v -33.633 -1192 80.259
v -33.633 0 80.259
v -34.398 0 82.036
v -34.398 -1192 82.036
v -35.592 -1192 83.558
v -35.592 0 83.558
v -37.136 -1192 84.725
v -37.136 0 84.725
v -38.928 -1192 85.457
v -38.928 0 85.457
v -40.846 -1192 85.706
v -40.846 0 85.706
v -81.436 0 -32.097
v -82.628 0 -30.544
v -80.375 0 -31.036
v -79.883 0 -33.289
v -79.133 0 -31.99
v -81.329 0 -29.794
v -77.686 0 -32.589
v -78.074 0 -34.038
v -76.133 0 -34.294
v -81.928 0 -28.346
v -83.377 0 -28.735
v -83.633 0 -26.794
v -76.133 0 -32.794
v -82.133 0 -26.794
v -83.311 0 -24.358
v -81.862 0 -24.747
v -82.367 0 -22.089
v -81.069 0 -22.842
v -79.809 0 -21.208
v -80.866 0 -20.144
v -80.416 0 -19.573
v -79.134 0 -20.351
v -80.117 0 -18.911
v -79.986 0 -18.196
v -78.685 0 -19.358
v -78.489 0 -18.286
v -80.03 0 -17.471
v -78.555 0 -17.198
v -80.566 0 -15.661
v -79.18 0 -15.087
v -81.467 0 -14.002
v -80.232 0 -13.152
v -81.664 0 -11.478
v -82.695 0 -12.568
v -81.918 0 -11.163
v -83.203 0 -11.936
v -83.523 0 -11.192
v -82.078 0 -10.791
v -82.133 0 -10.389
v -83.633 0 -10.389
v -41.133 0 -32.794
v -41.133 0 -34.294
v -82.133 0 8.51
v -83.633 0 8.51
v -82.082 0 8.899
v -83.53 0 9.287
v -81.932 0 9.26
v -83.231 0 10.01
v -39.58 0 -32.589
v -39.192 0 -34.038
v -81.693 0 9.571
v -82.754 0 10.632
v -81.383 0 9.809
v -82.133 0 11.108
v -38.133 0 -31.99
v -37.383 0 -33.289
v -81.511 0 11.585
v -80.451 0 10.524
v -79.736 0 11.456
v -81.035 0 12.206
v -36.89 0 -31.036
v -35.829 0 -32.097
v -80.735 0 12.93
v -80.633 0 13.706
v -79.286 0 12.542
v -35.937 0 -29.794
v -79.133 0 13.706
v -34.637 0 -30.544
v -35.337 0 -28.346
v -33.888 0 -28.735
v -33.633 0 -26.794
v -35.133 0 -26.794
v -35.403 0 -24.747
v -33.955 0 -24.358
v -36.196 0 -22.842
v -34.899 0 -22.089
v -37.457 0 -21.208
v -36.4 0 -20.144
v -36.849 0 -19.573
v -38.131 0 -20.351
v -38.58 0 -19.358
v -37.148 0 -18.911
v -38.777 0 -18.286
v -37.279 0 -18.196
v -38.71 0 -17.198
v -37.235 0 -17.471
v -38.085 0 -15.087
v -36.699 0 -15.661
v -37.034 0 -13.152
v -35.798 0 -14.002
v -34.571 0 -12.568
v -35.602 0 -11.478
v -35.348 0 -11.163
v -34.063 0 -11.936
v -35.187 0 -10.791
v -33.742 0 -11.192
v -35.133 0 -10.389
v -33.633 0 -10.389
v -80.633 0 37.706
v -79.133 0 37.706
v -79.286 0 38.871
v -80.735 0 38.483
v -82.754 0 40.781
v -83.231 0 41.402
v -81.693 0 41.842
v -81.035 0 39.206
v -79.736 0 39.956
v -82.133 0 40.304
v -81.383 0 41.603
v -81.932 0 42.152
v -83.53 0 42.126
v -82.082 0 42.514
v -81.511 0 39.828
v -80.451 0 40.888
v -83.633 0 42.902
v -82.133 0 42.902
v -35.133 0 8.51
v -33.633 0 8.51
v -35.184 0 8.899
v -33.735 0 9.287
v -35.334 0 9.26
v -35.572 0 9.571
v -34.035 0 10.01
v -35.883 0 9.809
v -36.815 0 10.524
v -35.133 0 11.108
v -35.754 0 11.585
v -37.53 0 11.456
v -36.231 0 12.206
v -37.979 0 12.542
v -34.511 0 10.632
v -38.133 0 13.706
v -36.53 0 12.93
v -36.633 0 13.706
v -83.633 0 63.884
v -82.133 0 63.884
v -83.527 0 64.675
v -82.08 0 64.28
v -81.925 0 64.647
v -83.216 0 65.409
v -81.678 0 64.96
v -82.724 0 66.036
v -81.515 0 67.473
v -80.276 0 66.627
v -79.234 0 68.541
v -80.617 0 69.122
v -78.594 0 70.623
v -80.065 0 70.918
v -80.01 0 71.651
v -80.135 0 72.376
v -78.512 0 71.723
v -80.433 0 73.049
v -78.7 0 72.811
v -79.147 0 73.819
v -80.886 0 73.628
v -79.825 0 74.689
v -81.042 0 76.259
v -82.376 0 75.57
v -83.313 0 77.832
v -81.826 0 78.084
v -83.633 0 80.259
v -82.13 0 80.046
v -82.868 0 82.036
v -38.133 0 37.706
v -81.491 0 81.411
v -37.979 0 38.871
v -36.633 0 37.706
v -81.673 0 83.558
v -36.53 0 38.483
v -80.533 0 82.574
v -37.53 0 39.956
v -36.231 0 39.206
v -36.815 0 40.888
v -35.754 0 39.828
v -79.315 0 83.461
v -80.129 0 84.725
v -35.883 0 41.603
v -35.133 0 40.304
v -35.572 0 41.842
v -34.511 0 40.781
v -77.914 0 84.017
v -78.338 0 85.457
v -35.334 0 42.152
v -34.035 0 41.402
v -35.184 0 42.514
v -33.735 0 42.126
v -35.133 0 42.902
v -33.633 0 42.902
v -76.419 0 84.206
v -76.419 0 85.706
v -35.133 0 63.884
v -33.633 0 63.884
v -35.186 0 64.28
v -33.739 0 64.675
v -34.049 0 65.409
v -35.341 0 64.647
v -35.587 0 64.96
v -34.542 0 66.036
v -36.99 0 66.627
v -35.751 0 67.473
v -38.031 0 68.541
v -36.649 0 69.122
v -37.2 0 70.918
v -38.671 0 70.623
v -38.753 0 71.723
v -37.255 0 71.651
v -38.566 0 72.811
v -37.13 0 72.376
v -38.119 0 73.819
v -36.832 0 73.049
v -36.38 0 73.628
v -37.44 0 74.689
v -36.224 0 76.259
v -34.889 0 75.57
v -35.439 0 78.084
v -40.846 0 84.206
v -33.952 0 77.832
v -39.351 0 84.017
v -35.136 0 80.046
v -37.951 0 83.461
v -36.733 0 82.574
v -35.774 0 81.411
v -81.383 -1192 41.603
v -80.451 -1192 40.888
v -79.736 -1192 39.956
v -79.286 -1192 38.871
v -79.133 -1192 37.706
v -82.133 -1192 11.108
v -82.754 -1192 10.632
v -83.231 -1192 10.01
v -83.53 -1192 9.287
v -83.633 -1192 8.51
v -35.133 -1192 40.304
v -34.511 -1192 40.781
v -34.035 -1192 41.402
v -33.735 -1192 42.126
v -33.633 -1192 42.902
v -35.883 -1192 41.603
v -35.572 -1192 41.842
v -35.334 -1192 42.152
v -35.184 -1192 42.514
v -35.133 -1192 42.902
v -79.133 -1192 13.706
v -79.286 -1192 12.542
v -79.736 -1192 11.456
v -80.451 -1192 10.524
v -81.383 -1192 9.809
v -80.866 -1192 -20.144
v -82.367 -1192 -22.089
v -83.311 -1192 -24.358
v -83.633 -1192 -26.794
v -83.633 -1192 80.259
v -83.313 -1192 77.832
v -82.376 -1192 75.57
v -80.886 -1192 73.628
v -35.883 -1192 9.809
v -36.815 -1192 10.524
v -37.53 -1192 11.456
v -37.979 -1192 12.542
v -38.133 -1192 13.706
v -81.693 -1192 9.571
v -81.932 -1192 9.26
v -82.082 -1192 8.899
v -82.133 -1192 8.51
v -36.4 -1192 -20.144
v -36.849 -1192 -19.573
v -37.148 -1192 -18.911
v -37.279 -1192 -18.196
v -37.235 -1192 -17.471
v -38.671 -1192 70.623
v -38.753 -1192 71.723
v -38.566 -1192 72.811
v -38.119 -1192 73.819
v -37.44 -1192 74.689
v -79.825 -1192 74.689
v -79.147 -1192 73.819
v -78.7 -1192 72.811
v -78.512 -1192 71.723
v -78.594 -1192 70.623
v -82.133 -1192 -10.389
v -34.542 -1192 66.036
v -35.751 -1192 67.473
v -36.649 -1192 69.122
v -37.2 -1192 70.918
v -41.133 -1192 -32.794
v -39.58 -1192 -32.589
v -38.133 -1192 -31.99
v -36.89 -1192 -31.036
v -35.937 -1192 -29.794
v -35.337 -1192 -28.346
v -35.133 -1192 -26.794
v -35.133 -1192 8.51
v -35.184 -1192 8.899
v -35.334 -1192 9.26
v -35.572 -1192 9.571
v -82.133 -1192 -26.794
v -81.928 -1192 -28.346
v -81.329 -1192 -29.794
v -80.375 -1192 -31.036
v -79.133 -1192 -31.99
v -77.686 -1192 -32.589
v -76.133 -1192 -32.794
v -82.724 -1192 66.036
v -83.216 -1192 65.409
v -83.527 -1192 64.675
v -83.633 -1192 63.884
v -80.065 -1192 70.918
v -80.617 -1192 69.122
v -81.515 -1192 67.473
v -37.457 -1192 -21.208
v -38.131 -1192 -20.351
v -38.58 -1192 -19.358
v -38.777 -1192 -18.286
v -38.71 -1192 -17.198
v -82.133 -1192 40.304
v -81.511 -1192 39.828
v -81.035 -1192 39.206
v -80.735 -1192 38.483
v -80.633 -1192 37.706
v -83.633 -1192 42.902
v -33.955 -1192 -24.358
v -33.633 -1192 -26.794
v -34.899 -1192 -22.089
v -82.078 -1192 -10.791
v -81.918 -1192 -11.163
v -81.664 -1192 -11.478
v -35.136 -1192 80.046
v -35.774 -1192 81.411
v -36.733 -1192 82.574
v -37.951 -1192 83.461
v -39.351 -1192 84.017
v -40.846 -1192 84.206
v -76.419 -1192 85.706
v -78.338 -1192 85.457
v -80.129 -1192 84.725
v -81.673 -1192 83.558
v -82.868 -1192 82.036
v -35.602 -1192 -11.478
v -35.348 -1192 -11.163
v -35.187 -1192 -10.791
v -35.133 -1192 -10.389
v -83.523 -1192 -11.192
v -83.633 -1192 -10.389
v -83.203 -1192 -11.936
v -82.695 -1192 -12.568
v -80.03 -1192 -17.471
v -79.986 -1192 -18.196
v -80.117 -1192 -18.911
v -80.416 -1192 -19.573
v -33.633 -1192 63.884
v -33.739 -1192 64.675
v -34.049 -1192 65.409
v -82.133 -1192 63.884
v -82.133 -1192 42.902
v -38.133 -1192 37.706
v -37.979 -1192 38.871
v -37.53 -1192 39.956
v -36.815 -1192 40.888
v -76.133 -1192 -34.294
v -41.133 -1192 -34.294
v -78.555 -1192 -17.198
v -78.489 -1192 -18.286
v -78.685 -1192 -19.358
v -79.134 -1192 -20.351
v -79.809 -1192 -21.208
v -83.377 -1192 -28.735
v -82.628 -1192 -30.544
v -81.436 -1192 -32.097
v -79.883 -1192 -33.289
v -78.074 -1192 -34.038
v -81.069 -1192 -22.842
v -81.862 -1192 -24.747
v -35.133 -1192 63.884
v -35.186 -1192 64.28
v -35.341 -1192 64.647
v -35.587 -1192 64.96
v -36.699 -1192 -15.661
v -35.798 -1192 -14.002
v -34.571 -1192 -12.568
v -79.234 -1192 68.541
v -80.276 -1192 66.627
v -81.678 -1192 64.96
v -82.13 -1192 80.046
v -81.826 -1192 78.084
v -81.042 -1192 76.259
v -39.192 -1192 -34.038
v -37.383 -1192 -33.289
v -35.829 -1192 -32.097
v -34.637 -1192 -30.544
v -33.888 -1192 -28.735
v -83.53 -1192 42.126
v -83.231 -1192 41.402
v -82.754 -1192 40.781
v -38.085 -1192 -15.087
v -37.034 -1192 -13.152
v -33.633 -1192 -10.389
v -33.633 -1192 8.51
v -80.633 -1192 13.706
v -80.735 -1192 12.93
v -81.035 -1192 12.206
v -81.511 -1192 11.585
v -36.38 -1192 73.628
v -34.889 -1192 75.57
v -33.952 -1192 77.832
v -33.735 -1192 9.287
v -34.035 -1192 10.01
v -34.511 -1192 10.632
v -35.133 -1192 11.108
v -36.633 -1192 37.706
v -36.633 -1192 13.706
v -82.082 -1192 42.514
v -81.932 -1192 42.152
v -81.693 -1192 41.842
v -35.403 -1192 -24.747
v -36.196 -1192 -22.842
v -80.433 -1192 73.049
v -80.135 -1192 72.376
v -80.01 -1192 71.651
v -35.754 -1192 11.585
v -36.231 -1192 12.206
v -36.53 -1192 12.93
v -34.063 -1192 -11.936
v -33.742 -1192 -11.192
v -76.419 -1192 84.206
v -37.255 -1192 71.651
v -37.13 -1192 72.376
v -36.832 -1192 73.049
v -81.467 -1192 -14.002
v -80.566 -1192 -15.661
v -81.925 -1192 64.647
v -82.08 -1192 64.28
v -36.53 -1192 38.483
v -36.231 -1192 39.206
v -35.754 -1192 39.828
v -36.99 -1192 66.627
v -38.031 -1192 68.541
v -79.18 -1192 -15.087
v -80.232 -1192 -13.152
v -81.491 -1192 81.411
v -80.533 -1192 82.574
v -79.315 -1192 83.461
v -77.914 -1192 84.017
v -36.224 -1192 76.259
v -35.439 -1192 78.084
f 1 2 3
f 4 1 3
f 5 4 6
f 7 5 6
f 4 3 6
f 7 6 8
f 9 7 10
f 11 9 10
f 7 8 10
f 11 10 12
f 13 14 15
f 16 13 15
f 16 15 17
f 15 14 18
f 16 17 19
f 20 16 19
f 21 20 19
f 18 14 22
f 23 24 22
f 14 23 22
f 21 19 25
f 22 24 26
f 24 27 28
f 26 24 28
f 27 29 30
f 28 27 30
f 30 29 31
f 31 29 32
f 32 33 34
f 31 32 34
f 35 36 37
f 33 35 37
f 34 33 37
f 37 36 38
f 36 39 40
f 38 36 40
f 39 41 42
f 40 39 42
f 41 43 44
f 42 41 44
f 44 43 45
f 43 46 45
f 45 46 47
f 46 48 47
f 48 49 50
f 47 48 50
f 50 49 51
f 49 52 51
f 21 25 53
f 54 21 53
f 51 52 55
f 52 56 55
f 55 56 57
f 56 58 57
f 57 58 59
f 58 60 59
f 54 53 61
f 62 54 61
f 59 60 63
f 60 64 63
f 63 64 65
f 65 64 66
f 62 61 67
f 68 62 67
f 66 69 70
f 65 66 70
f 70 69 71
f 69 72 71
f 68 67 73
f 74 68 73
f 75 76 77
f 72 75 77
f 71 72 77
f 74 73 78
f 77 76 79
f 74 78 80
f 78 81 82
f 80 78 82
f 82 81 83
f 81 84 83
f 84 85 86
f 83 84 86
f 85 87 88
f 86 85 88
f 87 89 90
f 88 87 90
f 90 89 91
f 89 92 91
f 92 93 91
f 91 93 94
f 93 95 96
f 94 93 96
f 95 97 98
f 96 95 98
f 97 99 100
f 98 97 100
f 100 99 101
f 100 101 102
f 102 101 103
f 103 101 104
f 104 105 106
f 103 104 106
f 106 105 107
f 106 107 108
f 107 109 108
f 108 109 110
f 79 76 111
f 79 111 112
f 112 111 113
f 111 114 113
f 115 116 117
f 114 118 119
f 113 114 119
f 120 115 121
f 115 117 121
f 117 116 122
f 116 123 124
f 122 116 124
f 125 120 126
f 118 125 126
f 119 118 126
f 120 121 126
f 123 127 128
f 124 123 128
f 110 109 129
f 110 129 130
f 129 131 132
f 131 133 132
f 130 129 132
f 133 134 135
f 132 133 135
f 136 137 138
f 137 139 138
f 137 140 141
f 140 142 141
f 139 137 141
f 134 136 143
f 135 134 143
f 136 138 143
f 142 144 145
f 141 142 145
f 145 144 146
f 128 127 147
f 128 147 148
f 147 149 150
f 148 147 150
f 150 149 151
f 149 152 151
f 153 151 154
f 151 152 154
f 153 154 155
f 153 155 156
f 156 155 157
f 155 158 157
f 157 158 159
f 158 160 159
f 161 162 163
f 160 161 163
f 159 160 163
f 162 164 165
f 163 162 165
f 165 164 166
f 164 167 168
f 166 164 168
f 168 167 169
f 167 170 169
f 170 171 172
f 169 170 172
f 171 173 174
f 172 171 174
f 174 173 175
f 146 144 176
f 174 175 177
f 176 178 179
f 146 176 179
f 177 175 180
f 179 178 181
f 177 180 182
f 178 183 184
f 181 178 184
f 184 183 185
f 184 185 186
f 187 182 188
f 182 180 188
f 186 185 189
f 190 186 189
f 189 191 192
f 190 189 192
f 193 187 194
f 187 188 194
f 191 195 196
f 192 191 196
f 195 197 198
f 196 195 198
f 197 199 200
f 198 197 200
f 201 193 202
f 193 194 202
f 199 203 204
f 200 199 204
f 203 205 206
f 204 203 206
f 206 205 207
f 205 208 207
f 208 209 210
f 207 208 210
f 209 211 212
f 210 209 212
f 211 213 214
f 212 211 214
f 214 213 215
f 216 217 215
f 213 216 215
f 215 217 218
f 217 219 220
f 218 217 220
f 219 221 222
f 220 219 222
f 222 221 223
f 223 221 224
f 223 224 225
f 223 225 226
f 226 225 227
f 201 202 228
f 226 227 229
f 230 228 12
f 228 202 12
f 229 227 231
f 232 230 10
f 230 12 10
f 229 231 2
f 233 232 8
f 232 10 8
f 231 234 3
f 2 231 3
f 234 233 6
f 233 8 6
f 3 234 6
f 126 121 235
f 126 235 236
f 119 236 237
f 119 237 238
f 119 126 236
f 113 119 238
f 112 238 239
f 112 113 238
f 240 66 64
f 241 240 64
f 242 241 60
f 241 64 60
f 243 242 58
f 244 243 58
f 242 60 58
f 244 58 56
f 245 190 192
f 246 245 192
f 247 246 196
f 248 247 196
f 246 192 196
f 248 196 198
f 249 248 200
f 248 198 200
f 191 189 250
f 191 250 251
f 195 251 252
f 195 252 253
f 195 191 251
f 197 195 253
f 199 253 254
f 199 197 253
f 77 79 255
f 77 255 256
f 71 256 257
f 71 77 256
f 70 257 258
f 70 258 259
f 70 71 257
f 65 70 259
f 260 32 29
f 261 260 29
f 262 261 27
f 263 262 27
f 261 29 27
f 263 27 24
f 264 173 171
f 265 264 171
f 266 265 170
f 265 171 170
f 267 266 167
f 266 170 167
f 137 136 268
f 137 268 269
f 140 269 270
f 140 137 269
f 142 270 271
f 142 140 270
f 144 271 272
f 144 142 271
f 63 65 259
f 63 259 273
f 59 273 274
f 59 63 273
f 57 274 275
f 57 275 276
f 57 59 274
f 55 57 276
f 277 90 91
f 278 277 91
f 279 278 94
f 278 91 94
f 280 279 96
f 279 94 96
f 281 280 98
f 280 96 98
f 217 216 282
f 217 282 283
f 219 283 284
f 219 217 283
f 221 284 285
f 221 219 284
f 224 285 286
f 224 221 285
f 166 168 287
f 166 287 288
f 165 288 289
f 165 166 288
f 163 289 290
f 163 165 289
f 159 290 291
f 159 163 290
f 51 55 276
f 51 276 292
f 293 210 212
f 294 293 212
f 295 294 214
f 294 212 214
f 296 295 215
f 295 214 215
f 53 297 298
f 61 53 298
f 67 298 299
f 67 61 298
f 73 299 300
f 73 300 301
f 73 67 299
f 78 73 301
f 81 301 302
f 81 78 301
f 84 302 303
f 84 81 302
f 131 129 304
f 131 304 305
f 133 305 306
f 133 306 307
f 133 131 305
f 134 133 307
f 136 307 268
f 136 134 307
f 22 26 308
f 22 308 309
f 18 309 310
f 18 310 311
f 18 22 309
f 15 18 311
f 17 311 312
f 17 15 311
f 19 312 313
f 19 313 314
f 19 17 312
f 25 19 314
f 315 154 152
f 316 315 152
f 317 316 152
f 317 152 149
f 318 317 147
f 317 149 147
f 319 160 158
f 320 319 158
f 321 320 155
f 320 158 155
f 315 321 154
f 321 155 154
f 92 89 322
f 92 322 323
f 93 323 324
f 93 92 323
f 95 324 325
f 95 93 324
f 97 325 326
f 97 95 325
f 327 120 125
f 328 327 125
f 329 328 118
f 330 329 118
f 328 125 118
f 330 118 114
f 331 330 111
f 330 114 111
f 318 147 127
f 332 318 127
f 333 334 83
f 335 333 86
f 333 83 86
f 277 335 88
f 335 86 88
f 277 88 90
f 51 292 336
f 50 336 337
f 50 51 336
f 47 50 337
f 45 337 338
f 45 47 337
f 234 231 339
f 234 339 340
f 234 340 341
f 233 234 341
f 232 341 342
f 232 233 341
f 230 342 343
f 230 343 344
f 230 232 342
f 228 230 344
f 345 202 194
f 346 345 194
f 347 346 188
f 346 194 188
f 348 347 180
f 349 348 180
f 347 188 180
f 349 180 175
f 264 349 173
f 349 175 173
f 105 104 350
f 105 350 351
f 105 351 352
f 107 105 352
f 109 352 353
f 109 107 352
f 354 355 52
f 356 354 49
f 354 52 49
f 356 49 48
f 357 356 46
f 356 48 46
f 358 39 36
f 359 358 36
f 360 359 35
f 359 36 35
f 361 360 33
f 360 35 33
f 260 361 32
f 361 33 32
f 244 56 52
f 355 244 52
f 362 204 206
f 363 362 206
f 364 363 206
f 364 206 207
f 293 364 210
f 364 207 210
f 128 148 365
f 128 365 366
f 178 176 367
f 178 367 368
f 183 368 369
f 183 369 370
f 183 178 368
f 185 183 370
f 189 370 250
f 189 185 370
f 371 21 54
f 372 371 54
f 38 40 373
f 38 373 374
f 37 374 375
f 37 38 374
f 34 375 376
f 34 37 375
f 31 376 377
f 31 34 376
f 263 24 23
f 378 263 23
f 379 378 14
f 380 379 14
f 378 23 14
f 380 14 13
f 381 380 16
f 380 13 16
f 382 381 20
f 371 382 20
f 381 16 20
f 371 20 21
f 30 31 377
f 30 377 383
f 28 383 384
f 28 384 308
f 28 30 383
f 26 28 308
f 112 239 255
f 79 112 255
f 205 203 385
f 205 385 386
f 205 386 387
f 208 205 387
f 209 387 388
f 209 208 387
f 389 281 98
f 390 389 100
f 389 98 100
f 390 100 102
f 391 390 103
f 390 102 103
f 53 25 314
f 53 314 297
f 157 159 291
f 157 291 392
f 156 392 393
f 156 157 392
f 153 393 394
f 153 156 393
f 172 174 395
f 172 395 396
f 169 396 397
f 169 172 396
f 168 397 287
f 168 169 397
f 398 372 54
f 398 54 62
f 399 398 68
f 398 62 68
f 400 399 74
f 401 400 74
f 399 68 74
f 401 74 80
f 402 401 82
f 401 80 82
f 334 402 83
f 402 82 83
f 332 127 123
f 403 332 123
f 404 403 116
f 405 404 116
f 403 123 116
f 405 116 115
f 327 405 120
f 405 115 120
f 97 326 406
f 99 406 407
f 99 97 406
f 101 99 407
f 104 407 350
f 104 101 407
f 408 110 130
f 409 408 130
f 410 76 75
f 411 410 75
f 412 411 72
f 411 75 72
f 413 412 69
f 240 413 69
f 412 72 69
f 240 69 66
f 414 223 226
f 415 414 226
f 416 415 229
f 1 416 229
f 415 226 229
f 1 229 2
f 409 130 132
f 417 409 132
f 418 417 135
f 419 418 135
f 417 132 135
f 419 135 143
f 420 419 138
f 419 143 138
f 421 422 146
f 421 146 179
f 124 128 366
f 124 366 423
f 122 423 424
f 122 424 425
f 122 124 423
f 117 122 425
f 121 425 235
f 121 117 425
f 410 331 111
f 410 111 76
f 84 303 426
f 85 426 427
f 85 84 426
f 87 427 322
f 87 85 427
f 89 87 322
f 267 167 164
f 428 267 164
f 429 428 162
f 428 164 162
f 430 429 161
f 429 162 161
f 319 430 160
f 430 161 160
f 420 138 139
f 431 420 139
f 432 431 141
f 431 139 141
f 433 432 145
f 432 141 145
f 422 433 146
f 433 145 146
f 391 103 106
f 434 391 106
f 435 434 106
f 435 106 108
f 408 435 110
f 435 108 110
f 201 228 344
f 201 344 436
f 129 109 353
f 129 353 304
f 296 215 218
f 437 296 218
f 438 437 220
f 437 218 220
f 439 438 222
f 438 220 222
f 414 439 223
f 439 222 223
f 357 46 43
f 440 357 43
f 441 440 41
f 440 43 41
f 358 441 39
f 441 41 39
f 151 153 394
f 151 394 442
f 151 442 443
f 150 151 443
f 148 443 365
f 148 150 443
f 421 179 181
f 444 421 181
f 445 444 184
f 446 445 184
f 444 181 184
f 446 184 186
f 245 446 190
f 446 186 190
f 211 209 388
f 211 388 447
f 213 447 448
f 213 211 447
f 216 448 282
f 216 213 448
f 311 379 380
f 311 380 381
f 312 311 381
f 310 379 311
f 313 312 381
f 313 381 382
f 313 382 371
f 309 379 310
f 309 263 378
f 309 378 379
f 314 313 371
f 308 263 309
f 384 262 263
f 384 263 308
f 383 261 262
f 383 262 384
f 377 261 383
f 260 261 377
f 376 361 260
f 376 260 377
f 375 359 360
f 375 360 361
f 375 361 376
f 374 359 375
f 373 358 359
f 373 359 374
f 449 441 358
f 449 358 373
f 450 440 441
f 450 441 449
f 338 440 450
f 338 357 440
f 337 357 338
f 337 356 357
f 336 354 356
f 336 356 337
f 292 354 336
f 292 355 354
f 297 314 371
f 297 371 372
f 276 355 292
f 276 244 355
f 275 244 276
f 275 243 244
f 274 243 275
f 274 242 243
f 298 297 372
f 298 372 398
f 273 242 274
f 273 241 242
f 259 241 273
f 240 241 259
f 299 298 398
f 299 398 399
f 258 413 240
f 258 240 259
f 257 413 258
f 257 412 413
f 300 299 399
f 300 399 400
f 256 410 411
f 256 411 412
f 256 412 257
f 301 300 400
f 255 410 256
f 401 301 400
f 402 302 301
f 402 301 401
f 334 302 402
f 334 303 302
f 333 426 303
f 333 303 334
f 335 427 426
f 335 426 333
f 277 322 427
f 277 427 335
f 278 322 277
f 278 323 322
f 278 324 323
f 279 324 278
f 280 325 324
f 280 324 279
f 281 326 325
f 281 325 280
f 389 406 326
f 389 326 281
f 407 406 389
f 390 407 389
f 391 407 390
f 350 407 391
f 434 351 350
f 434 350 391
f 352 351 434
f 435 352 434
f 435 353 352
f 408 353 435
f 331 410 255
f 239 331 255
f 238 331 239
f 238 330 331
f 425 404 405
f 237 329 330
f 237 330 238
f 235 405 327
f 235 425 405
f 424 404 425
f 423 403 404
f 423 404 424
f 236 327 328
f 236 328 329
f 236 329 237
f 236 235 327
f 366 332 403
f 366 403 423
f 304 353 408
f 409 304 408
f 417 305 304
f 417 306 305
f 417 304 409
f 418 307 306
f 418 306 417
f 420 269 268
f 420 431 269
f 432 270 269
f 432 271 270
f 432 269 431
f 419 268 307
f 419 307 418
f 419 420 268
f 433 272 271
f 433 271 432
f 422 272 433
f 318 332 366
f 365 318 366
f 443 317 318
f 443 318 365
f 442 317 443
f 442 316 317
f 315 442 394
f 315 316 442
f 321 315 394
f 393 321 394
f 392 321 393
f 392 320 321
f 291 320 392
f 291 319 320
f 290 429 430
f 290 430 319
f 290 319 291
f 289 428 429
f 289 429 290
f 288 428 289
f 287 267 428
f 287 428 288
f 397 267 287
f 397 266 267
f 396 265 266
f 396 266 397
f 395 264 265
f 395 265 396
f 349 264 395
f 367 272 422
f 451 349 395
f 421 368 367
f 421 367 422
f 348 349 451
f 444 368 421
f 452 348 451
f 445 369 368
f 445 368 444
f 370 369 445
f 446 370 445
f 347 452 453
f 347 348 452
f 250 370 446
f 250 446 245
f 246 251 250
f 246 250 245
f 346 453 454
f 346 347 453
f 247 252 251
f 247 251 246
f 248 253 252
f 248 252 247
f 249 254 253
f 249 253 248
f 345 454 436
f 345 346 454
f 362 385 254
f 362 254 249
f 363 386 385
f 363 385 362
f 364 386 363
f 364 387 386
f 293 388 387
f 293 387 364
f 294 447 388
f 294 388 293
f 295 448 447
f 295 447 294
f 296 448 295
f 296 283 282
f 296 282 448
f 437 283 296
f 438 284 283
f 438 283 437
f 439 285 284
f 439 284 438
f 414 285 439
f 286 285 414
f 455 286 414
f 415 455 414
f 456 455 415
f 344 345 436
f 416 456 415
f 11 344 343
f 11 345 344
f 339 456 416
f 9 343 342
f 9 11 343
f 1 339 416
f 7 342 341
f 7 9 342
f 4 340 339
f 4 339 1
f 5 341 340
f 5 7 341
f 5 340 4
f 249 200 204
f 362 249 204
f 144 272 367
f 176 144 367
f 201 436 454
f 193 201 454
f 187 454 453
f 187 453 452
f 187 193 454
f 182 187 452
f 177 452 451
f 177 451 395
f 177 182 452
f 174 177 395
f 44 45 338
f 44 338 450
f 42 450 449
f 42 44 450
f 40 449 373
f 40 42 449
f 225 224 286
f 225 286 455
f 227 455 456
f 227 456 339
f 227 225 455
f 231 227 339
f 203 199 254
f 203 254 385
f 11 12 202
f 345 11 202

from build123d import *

# Parameters (mm, degrees)
F1_DEPTH = 1192
F2_T     = -1.5


with BuildPart() as f1:
    # F0 (on Front) → F1 (new body)
    with BuildSketch(Plane.XZ):
        with BuildLine():
            Line((-40.846474, 85.706456), (-76.418904, 85.706456))
            ThreePointArc((-76.418904, 85.706456), (-80.938799, 84.191483), (-83.632689, 80.258603))
            ThreePointArc((-83.632689, 80.258603), (-82.918779, 76.67027), (-80.88578, 73.628443))
            ThreePointArc((-80.88578, 73.628443), (-80.13546, 72.376035), (-80.065164, 70.917761))
            ThreePointArc((-80.065164, 70.917761), (-81.024186, 68.275196), (-82.723568, 66.035783))
            ThreePointArc((-82.723568, 66.035783), (-83.396078, 65.05222), (-83.632689, 63.884452))
            Line((-83.632689, 63.884452), (-83.632689, 42.902452))
            ThreePointArc((-83.632689, 42.902452), (-83.230765, 41.402452), (-82.132689, 40.304376))
            ThreePointArc((-82.132689, 40.304376), (-81.034613, 39.2063), (-80.632689, 37.7063))
            Line((-80.632689, 37.7063), (-80.632689, 13.706456))
            ThreePointArc((-80.632689, 13.706456), (-81.034613, 12.206456), (-82.132689, 11.10838))
            ThreePointArc((-82.132689, 11.10838), (-83.230765, 10.010304), (-83.632689, 8.510304))
            Line((-83.632689, 8.510304), (-83.632689, -10.388976))
            ThreePointArc((-83.632689, -10.388976), (-83.38823, -11.575142), (-82.694695, -12.567996))
            ThreePointArc((-82.694695, -12.567996), (-80.972966, -14.807673), (-80.030346, -17.470749))
            ThreePointArc((-80.030346, -17.470749), (-80.11711, -18.910604), (-80.865855, -20.143524))
            ThreePointArc((-80.865855, -20.143524), (-82.913386, -23.19222), (-83.632689, -26.793544))
            ThreePointArc((-83.632689, -26.793544), (-81.43599, -32.096845), (-76.132689, -34.293544))
            Line((-76.132689, -34.293544), (-41.132689, -34.293544))
            ThreePointArc((-41.132689, -34.293544), (-35.829388, -32.096845), (-33.632689, -26.793544))
            ThreePointArc((-33.632689, -26.793544), (-34.351992, -23.19222), (-36.399522, -20.143524))
            ThreePointArc((-36.399522, -20.143524), (-37.148267, -18.910604), (-37.235032, -17.470749))
            ThreePointArc((-37.235032, -17.470749), (-36.292412, -14.807673), (-34.570682, -12.567996))
            ThreePointArc((-34.570682, -12.567996), (-33.877147, -11.575142), (-33.632689, -10.388976))
            Line((-33.632689, -10.388976), (-33.632689, 8.510304))
            ThreePointArc((-33.632689, 8.510304), (-34.034613, 10.010304), (-35.132689, 11.10838))
            ThreePointArc((-35.132689, 11.10838), (-36.230765, 12.206456), (-36.632689, 13.706456))
            Line((-36.632689, 13.706456), (-36.632689, 37.7063))
            ThreePointArc((-36.632689, 37.7063), (-36.230765, 39.2063), (-35.132689, 40.304376))
            ThreePointArc((-35.132689, 40.304376), (-34.034613, 41.402452), (-33.632689, 42.902452))
            Line((-33.632689, 42.902452), (-33.632689, 63.884452))
            ThreePointArc((-33.632689, 63.884452), (-33.8693, 65.05222), (-34.541809, 66.035783))
            ThreePointArc((-34.541809, 66.035783), (-36.241192, 68.275196), (-37.200214, 70.917761))
            ThreePointArc((-37.200214, 70.917761), (-37.129917, 72.376035), (-36.379598, 73.628443))
            ThreePointArc((-36.379598, 73.628443), (-34.346598, 76.67027), (-33.632689, 80.258603))
            ThreePointArc((-33.632689, 80.258603), (-36.326579, 84.191483), (-40.846474, 85.706456))
        make_face()
    extrude(amount=F1_DEPTH)

    # F2
    f2_openings = [f1.faces().sort_by_distance(p)[0] for p in [
        (-58.632689, 0, 25.725749),
        (-58.632689, -1192, 25.725749),
    ]]
    offset(amount=F2_T, openings=f2_openings)


solid = f1.part
